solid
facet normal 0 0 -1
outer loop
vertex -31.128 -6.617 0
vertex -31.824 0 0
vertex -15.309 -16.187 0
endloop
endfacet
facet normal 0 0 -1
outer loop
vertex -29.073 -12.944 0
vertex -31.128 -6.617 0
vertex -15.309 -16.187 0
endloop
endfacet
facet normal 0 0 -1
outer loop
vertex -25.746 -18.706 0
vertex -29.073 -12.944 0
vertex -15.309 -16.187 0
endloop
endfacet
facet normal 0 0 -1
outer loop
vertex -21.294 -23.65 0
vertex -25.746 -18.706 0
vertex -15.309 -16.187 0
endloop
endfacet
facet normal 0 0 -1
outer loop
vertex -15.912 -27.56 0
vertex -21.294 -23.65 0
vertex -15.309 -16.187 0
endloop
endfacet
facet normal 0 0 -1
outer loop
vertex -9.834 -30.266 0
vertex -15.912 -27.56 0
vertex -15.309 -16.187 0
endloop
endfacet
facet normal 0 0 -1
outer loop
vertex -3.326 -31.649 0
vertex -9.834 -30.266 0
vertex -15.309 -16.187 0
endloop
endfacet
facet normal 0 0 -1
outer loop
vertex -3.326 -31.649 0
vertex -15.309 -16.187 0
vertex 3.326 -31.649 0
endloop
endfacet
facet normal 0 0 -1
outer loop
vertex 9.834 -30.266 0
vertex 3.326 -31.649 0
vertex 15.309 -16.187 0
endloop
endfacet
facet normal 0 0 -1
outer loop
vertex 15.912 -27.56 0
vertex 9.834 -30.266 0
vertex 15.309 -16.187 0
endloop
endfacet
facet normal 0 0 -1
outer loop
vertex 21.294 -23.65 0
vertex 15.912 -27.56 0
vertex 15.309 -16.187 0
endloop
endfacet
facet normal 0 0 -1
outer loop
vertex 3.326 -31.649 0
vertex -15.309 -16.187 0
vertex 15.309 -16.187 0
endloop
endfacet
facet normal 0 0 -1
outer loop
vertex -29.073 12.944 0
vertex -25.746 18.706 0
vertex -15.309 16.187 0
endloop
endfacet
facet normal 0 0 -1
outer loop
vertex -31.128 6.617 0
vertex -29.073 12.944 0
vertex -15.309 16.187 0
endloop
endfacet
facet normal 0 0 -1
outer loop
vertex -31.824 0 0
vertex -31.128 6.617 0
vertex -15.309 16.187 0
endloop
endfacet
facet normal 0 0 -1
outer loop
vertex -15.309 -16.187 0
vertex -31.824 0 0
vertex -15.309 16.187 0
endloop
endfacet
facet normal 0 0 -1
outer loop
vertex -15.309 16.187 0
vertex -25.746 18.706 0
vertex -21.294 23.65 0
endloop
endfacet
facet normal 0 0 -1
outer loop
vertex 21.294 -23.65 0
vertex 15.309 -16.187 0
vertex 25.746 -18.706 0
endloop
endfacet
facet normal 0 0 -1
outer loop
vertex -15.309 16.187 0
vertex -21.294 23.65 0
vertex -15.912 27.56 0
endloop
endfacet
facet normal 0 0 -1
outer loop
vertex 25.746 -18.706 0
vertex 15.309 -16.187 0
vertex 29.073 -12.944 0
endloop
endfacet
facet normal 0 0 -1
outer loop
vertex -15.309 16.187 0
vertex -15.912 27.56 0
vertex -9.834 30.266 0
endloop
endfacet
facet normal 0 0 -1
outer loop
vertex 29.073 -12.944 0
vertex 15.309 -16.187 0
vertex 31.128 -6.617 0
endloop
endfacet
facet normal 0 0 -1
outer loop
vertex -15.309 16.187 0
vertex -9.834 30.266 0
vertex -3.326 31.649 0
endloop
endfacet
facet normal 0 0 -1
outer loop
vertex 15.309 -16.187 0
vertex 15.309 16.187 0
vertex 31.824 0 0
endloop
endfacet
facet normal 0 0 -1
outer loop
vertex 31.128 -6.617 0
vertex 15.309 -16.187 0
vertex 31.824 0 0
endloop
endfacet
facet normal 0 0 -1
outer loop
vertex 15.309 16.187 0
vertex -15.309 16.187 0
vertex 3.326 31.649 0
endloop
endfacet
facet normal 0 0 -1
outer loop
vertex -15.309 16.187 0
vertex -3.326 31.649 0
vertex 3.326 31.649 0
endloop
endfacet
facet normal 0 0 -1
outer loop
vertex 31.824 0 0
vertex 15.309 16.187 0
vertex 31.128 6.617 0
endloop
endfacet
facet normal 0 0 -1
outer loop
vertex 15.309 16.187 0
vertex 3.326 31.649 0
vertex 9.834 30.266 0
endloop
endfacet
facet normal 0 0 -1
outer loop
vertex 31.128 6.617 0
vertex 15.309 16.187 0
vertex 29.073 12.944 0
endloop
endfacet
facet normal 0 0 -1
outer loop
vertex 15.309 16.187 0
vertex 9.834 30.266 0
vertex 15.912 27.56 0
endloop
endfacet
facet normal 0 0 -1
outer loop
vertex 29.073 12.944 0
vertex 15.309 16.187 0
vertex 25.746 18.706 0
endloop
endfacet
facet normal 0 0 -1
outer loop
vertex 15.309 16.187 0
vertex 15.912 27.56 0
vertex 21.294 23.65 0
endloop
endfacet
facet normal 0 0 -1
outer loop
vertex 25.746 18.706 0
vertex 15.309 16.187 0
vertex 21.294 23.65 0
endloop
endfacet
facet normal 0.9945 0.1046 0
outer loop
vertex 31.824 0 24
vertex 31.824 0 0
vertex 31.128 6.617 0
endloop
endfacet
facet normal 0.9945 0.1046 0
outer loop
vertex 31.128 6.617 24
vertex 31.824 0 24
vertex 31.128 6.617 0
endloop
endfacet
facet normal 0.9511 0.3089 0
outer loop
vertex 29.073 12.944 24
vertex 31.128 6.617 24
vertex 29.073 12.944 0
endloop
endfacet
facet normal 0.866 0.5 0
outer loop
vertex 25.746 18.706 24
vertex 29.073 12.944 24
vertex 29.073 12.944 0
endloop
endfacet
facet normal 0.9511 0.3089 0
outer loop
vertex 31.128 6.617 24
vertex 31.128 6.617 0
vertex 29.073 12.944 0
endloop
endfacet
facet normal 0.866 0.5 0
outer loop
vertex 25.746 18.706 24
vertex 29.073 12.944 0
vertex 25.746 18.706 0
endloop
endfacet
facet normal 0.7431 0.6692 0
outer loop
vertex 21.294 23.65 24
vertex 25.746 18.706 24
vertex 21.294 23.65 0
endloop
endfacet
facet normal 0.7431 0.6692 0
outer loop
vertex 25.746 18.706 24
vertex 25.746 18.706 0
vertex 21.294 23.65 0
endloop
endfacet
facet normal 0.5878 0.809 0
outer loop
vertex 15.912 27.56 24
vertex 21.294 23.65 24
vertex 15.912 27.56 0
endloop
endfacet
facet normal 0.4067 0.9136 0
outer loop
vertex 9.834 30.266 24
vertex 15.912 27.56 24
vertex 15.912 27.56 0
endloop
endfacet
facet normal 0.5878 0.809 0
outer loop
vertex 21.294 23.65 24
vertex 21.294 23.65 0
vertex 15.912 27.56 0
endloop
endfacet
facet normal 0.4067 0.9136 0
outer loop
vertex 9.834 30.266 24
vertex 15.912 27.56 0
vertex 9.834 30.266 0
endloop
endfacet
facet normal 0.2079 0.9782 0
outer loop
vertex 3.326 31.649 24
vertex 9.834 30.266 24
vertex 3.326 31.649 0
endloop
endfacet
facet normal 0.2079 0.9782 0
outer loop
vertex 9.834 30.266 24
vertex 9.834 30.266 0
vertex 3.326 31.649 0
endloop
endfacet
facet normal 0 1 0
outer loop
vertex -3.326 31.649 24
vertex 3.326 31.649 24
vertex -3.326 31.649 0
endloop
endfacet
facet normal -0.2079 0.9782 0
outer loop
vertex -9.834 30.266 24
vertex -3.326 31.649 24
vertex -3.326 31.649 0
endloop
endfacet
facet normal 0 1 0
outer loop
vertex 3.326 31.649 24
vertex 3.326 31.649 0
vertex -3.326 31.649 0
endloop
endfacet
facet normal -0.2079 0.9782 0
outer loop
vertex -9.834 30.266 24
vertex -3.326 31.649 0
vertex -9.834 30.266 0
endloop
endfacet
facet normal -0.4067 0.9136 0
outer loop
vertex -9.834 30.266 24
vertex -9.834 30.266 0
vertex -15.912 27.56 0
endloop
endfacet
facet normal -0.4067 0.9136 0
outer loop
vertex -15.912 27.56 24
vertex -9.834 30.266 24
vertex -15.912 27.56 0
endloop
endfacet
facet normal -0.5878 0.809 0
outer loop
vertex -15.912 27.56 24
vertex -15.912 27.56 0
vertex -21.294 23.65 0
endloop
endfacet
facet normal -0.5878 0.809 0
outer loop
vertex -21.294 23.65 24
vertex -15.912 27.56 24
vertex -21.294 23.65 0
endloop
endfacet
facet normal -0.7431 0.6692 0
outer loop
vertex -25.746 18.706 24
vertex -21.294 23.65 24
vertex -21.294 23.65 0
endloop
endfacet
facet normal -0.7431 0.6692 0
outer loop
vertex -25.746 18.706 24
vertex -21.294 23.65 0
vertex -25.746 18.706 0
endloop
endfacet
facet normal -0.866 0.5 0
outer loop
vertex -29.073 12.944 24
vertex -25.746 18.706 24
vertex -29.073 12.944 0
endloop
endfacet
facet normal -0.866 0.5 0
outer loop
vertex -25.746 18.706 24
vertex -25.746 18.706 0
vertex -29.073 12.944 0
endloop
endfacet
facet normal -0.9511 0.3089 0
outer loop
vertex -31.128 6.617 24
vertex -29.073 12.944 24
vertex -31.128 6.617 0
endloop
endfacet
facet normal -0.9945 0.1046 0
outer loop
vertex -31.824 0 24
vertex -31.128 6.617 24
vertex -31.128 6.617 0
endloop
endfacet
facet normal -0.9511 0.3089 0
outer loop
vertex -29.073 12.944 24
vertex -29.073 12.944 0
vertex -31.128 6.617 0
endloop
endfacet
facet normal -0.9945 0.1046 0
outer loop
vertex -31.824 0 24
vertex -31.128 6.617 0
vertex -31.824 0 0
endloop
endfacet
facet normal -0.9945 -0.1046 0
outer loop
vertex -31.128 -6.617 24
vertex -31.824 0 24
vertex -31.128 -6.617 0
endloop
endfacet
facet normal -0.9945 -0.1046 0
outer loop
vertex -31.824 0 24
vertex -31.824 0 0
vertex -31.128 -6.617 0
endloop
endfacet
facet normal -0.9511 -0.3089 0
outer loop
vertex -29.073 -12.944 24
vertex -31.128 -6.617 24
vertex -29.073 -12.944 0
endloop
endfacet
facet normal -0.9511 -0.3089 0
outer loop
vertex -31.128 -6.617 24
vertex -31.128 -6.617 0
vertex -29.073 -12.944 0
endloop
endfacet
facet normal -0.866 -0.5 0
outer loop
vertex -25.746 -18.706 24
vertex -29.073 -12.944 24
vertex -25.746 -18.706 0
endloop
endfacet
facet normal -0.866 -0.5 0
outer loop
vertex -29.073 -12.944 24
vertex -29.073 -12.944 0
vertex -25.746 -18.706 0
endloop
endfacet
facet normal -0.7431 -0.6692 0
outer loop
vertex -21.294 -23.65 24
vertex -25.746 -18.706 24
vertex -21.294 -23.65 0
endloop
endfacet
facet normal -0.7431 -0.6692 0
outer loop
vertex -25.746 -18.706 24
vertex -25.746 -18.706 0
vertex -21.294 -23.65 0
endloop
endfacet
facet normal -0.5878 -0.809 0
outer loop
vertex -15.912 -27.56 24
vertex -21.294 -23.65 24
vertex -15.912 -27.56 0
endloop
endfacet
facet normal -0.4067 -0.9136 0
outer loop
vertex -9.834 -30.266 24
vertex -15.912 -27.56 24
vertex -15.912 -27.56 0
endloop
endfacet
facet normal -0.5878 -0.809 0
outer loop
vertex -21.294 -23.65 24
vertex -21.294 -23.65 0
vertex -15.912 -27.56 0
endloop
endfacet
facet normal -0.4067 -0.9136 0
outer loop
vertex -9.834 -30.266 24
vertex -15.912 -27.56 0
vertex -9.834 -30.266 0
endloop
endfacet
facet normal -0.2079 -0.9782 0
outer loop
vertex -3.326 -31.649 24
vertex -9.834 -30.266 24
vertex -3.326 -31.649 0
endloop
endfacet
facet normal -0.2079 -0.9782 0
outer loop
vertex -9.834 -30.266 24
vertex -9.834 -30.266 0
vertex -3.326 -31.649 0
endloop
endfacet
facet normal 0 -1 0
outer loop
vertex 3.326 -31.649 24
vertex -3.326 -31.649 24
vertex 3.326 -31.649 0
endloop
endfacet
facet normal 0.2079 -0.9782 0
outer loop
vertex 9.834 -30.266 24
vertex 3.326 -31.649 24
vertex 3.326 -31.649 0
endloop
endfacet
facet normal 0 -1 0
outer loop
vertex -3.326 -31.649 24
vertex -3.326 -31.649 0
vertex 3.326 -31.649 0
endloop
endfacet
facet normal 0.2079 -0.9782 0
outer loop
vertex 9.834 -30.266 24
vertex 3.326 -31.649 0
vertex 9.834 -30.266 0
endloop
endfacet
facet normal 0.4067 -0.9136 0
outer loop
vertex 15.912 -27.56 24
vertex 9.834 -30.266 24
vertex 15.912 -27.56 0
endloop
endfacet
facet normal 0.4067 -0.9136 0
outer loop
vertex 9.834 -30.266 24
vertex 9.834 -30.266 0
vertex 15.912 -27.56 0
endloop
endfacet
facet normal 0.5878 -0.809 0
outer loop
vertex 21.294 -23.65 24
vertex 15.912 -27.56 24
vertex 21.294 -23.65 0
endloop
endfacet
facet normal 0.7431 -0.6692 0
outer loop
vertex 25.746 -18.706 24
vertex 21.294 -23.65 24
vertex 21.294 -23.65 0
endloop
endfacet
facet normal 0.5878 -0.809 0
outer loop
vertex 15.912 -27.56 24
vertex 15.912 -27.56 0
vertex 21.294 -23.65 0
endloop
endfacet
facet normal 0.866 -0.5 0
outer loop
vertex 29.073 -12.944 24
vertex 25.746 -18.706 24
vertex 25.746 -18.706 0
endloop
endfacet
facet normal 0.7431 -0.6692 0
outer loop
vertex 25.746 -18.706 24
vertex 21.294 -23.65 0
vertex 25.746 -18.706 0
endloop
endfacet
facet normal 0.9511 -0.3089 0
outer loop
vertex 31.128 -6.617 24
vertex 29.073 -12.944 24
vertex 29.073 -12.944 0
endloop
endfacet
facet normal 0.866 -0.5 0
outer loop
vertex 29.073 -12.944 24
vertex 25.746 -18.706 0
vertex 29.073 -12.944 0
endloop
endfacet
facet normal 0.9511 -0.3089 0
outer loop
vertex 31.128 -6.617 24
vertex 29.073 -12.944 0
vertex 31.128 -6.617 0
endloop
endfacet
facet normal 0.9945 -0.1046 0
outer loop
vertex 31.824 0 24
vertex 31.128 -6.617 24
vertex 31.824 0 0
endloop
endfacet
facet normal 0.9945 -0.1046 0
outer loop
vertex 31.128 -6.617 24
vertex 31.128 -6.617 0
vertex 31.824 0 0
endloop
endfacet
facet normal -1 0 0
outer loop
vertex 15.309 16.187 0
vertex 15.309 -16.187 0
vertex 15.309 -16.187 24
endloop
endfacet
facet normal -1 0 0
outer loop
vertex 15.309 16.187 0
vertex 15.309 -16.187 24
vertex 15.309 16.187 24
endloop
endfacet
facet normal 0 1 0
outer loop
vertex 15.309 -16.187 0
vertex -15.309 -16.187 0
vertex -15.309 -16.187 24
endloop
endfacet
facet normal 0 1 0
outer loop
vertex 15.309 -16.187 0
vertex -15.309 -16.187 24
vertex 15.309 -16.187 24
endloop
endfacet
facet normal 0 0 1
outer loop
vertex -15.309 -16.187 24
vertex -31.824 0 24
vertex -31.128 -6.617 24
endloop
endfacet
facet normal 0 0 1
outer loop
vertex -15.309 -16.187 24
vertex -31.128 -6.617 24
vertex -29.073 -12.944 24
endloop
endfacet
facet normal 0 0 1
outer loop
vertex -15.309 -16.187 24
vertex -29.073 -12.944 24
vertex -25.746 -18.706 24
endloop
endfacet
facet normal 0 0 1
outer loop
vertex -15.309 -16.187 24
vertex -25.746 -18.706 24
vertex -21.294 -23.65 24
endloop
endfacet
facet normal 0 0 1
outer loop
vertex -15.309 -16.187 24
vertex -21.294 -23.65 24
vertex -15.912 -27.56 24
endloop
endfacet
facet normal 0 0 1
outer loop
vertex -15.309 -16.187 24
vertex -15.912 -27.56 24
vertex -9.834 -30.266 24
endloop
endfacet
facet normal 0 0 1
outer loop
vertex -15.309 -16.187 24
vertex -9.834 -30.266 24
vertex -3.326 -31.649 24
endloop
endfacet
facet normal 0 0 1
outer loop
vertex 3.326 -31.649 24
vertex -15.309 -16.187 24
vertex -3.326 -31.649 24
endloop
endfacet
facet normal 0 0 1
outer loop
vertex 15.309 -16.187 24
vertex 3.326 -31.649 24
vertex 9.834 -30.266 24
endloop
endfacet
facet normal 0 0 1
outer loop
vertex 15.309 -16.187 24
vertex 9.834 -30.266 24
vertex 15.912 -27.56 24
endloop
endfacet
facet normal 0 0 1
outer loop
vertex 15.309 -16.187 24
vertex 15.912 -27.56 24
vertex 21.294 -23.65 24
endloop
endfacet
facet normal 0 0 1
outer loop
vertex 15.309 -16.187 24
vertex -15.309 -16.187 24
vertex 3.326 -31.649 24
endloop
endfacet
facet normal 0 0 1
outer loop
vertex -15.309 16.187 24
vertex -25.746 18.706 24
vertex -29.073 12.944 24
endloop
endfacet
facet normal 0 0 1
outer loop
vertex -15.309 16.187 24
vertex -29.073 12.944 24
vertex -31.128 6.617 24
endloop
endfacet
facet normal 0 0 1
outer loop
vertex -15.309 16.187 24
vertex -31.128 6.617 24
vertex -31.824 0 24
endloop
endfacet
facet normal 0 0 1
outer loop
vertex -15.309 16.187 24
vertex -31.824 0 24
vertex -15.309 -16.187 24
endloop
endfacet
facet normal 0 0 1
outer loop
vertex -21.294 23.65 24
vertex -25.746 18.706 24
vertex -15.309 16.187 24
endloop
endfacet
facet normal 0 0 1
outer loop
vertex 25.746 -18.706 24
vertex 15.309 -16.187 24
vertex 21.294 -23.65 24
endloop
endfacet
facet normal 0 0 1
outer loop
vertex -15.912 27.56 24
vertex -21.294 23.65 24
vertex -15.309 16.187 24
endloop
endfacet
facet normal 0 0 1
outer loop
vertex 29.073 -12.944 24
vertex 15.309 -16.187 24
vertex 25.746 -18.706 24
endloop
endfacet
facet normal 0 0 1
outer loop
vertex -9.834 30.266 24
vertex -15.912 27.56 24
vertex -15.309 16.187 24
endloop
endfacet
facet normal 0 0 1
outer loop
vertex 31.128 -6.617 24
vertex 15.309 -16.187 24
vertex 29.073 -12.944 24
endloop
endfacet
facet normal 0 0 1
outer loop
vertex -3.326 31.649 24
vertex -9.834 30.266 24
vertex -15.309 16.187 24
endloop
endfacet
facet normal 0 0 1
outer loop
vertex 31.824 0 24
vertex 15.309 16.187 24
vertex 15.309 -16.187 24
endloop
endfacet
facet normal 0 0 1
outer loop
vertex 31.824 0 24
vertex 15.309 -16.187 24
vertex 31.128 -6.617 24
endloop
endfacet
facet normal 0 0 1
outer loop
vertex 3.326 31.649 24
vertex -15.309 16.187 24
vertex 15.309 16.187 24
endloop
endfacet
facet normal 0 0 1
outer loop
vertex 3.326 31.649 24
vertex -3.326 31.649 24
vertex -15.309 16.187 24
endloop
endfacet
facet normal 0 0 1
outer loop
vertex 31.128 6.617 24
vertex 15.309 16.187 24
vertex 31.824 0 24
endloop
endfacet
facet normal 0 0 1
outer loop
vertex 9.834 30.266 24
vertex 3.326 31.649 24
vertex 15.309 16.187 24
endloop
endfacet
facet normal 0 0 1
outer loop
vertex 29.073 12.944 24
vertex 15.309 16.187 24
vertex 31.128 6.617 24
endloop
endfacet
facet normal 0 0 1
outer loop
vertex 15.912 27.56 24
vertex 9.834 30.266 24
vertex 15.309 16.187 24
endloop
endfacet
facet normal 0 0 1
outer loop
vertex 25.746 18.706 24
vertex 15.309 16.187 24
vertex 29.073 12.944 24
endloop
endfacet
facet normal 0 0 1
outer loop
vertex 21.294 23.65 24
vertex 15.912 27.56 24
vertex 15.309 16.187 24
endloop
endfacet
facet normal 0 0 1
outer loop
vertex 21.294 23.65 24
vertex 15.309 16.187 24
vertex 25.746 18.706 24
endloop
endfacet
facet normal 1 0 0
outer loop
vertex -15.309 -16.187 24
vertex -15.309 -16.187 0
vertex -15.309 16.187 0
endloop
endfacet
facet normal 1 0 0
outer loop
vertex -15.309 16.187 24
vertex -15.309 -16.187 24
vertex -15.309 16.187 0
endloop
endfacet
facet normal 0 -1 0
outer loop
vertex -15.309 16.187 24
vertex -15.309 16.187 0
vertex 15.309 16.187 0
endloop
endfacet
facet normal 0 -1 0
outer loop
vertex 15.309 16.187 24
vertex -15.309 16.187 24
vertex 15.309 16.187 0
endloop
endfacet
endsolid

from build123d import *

# Parameters (mm, degrees)
F0_W     = 30.617888
F0_H     = 32.374126
F1_DEPTH = 25
F2_R     = 31.82383
F3_DEPTH = 24


with BuildPart() as f1:
    # F0 (on Top) → F1 (new body)
    with BuildSketch(Plane.XY):
        Rectangle(F0_W, F0_H)
    extrude(amount=F1_DEPTH)


with BuildPart() as f3:
    # F2 (on Top) → F3 (new body)
    with BuildSketch(Plane.XY):
        Circle(F2_R)
    extrude(amount=F3_DEPTH)

    # F4: cut F1
    add(f1.part, mode=Mode.SUBTRACT)


solid = f3.part
